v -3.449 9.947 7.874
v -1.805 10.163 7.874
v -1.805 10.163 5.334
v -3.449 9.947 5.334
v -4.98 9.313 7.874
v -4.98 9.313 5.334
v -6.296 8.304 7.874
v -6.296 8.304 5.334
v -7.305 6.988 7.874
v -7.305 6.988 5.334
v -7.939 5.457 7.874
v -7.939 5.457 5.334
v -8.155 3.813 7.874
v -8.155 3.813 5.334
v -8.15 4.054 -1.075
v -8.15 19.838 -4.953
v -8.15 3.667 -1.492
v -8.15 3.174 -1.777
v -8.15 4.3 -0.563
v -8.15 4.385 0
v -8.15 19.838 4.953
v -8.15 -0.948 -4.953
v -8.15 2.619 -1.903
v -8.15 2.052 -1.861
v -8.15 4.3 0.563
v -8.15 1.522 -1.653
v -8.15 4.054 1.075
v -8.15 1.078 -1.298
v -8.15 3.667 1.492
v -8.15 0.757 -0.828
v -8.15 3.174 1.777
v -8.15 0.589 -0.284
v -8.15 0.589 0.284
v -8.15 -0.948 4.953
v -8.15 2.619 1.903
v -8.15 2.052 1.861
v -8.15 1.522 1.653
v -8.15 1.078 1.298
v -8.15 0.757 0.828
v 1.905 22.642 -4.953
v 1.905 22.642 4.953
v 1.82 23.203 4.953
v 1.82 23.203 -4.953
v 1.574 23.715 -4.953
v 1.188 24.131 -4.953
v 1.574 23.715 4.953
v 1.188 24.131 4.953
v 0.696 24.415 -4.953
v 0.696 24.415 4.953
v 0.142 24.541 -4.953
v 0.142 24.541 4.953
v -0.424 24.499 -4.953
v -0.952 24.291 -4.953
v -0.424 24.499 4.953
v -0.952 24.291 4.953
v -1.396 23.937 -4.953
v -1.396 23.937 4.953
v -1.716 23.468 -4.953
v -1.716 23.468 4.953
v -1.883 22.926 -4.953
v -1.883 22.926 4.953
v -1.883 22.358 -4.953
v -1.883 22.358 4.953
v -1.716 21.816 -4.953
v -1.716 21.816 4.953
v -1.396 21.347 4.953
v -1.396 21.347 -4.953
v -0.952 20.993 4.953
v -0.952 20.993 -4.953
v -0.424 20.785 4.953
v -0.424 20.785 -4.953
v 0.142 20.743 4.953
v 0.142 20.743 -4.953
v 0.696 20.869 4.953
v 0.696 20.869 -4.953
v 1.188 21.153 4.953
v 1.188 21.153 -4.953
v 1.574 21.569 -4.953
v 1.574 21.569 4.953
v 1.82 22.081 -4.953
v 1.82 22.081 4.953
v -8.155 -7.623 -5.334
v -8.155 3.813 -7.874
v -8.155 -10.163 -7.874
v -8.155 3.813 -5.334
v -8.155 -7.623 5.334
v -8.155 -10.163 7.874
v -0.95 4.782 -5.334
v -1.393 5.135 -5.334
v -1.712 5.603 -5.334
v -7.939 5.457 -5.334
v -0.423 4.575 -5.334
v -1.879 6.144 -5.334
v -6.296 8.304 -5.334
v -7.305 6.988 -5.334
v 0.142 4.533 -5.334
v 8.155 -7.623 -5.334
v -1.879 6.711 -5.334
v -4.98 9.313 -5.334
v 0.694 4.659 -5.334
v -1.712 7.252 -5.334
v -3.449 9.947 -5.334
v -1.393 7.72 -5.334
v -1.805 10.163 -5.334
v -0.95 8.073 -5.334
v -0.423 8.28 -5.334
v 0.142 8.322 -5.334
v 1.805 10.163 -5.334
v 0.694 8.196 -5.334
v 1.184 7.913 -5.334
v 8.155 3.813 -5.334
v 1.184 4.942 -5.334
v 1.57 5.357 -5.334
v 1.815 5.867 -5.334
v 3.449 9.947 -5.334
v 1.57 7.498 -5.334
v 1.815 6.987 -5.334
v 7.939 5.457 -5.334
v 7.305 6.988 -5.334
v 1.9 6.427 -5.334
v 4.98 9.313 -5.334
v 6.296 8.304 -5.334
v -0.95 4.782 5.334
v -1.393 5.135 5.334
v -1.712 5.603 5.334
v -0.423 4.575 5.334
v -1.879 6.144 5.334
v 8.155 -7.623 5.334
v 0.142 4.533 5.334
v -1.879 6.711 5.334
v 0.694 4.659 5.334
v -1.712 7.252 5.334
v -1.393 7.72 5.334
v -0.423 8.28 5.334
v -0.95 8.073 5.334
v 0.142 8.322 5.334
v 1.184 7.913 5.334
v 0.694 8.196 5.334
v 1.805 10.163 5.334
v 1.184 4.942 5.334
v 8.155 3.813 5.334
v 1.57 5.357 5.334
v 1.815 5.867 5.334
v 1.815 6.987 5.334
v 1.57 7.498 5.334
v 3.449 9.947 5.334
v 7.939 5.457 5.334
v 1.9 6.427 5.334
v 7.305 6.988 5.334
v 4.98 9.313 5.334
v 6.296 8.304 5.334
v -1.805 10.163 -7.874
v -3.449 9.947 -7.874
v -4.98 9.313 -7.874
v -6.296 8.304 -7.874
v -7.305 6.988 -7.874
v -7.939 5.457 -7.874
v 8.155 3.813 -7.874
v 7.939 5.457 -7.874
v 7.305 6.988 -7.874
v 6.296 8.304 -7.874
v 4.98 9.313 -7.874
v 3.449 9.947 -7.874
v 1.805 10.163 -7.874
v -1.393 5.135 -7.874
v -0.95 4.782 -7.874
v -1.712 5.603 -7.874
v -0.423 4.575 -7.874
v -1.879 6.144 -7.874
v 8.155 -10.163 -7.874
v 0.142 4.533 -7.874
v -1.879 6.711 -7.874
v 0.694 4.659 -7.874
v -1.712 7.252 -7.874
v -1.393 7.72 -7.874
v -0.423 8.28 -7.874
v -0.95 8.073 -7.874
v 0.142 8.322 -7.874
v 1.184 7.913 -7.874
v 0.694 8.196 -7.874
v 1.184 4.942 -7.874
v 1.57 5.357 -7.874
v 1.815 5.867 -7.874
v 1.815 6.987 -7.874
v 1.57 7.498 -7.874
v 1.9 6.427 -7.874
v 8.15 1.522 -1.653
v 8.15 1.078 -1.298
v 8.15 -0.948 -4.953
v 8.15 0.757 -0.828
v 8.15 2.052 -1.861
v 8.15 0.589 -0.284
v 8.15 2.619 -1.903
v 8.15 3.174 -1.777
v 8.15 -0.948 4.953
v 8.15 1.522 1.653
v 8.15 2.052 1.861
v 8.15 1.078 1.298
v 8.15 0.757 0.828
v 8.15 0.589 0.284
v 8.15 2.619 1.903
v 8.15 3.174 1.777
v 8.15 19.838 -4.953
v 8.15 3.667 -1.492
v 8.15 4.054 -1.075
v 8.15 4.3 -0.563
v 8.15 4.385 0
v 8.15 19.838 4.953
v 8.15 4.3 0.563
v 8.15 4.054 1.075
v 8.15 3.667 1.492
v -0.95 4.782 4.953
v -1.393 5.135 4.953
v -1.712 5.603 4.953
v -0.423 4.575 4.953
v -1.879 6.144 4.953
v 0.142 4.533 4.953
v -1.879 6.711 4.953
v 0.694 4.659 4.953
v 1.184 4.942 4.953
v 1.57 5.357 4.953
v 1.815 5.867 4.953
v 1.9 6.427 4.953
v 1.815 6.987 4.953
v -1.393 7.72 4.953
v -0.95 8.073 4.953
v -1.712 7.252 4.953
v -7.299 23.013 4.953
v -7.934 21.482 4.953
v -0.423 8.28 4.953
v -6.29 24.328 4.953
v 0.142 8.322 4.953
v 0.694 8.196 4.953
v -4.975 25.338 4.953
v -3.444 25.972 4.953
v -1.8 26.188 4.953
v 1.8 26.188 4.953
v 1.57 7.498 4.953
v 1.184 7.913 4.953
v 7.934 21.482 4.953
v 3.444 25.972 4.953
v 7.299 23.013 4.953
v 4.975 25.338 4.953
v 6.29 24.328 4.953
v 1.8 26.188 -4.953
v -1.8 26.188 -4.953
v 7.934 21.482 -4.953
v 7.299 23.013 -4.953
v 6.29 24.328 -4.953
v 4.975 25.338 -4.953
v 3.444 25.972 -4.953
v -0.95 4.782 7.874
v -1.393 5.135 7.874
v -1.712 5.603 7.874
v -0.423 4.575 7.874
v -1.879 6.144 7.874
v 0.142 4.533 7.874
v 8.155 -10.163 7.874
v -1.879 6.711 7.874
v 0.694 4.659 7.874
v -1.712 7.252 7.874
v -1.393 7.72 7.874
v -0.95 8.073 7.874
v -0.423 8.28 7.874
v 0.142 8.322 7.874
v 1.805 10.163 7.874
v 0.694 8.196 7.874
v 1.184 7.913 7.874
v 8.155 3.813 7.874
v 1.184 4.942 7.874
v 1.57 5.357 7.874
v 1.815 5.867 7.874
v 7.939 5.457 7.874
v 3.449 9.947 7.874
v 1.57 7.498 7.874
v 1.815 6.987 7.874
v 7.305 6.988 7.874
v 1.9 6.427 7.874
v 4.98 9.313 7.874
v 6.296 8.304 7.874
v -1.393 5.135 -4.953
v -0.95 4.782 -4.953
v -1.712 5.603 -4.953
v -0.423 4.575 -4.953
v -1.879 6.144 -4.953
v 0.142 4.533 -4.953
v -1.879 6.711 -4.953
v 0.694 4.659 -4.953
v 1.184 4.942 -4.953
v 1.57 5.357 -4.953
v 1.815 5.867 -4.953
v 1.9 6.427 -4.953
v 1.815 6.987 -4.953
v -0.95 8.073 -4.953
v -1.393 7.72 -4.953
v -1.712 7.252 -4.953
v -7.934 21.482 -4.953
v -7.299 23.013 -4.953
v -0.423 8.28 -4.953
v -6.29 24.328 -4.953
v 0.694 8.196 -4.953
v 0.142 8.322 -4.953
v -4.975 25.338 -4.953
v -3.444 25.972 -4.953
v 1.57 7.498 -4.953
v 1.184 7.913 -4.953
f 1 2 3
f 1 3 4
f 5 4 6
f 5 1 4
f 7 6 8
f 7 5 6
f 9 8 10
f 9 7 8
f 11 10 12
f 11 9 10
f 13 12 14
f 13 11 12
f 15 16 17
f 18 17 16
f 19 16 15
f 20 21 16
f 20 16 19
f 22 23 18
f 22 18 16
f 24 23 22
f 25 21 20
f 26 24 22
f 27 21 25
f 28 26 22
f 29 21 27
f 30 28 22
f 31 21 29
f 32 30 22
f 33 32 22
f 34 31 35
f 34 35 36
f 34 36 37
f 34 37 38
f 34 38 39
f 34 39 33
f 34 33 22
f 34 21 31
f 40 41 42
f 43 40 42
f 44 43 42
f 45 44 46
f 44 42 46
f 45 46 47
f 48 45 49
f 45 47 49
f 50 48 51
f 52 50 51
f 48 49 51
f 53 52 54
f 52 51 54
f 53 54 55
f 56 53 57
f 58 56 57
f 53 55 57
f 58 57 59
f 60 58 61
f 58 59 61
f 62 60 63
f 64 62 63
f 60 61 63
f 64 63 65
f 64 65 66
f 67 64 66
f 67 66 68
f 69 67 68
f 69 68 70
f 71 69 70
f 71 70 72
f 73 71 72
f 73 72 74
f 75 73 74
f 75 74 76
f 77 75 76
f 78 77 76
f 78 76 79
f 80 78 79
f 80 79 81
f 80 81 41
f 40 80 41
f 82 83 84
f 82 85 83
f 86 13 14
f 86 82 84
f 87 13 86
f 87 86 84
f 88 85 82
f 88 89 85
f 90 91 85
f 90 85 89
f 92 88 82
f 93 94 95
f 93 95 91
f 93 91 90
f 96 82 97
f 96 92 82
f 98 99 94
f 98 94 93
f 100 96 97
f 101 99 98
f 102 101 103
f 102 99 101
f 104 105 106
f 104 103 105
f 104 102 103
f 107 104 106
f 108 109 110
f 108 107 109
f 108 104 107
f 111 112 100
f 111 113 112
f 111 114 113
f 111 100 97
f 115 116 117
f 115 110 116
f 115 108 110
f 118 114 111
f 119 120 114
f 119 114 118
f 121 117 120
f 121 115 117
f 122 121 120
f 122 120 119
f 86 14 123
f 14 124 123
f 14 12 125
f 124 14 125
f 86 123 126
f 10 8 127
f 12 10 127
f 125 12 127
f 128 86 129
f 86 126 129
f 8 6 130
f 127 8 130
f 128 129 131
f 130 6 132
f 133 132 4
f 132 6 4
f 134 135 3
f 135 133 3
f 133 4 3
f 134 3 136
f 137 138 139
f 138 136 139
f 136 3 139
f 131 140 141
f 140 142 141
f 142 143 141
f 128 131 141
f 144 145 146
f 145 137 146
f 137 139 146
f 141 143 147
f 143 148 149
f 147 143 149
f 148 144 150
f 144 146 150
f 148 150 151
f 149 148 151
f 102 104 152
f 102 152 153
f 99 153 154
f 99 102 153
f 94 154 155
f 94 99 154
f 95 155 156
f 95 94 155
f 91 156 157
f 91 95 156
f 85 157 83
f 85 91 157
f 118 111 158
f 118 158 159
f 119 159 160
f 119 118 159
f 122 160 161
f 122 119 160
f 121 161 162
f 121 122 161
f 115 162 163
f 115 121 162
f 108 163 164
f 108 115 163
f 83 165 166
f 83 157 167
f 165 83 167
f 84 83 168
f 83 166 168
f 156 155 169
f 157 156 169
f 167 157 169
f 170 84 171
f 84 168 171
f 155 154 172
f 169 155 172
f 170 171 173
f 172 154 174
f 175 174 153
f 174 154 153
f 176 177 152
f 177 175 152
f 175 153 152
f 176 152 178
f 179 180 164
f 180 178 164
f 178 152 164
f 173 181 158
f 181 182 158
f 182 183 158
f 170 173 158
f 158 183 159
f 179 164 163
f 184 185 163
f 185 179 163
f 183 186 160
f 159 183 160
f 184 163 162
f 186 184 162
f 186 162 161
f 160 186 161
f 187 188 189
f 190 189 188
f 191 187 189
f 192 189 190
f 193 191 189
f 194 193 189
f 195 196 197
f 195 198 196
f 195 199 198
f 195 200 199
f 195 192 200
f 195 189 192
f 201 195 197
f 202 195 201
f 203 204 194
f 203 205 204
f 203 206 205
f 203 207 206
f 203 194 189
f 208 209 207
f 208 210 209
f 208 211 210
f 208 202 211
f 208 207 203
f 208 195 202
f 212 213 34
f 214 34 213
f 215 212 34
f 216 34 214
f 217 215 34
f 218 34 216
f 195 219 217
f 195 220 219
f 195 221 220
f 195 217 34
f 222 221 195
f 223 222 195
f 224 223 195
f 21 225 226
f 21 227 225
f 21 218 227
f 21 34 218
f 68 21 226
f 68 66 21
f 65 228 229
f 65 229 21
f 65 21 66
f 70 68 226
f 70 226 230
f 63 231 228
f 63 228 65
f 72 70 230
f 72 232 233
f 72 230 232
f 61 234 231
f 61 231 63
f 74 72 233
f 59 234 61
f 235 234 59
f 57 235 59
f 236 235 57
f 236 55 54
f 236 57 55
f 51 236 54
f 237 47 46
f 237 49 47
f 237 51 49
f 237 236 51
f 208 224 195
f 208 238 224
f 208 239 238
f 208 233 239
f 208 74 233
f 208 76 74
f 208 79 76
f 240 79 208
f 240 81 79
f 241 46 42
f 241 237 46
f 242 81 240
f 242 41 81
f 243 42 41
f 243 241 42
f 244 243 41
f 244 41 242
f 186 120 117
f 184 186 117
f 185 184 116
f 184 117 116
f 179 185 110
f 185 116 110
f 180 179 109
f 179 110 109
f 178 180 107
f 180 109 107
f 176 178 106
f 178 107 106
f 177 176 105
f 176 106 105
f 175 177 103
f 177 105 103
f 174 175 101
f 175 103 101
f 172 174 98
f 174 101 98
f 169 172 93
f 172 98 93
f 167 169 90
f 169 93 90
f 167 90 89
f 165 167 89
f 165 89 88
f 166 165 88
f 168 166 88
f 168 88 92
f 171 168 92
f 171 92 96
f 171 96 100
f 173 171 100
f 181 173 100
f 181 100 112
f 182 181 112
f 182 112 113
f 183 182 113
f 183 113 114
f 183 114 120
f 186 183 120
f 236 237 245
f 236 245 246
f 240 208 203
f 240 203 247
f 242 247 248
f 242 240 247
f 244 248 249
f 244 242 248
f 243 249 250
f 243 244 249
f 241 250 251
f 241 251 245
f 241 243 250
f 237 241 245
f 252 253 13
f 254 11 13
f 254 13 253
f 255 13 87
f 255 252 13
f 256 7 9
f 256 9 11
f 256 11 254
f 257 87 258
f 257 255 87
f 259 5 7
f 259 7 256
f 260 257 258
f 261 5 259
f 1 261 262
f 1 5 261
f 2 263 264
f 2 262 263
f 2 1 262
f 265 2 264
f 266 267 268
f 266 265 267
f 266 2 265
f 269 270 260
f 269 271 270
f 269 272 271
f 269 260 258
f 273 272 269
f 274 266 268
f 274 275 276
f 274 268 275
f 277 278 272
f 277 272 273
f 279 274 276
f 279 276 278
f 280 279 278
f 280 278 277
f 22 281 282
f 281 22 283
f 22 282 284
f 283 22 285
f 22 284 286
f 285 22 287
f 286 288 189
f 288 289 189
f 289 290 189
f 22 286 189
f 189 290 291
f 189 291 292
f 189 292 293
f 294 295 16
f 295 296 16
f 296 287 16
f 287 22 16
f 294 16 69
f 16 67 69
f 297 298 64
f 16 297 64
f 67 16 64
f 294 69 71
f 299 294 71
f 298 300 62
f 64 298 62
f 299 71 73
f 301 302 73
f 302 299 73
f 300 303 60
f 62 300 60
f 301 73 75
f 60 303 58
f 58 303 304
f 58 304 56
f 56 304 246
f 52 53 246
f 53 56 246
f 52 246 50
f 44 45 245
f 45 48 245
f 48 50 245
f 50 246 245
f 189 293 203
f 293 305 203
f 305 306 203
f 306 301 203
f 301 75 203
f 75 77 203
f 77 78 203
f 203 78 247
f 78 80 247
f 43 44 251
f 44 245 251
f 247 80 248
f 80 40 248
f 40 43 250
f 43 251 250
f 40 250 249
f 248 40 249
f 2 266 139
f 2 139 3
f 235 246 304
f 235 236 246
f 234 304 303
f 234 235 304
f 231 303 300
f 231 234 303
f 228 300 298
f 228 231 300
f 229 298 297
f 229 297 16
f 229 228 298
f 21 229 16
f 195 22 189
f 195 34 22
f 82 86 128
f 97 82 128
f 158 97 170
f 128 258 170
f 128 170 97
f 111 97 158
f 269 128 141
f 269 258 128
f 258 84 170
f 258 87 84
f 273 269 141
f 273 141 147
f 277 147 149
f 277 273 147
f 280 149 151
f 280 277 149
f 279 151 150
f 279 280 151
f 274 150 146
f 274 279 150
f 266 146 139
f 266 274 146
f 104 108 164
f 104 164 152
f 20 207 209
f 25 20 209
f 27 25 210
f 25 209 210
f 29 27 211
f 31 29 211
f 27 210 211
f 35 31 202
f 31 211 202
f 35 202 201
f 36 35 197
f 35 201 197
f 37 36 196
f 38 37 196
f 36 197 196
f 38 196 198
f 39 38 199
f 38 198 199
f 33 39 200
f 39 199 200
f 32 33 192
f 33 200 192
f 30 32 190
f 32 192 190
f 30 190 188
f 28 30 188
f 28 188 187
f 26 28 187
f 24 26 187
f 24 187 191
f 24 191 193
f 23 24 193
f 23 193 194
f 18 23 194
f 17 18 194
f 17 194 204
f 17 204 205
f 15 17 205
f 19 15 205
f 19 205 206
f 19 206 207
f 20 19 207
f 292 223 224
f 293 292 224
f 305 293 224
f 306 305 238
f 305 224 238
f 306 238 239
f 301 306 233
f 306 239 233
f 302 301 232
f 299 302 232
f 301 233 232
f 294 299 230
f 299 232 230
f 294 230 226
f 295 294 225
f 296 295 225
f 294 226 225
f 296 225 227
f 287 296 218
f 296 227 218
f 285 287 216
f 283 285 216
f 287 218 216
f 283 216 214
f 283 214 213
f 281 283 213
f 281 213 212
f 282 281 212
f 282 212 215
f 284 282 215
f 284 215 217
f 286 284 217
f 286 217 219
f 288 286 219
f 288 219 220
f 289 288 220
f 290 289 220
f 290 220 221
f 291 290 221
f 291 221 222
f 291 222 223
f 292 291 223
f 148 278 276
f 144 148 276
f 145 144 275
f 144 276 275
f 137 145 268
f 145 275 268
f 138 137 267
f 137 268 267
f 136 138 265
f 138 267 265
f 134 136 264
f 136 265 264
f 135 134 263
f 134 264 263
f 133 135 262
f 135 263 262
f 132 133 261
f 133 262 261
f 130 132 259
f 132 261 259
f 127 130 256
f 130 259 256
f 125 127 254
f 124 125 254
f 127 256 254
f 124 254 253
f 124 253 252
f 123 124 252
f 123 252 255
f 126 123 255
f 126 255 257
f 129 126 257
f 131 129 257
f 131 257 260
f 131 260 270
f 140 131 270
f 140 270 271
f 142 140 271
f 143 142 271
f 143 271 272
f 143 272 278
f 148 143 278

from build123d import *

# Parameters (mm, degrees)
F1_DEPTH      = 7.874
F1_DEPTH_BACK = 7.874
F2_T          = -2.54
F4_DEPTH      = 4.953
F4_DEPTH_BACK = 4.953
F5_R          = 1.899737
F6_DEPTH      = 17.018
F5_R_2        = 1.90461
F7_DEPTH      = 14.986
F8_R          = 1.908602
F9_DEPTH      = 17.272


with BuildPart() as f1:
    # F0 (on Top) → F1 (new body, two sides)
    with BuildSketch(Plane.XY) as f1_sk:
        with BuildLine():
            Line((-8.155428, -10.163382), (8.155428, -10.163382))
            Line((8.155428, -10.163382), (8.155428, 3.813382))
            ThreePointArc((8.155428, 3.813382), (6.295556, 8.30351), (1.805428, 10.163382))
            Line((1.805428, 10.163382), (-1.805428, 10.163382))
            ThreePointArc((-1.805428, 10.163382), (-6.295556, 8.30351), (-8.155428, 3.813382))
            Line((-8.155428, 3.813382), (-8.155428, -10.163382))
        make_face()
    extrude(amount=F1_DEPTH)
    extrude(f1_sk.sketch, amount=-F1_DEPTH_BACK)

    # F2
    f2_openings = [f1.faces().sort_by_distance(p)[0] for p in [
        (8.155428, -3.175, 0),
        (6.295556, 8.30351, 0),
        (0, 10.163382, 0),
        (-6.295556, 8.30351, 0),
        (-8.155428, -3.175, 0),
    ]]
    offset(amount=F2_T, openings=f2_openings)


with BuildPart() as f4:
    # F3 (on Top) → F4 (new body, two sides)
    with BuildSketch(Plane.XY) as f4_sk:
        with BuildLine():
            Line((-8.150021, -0.947974), (8.150021, -0.947974))
            Line((8.150021, -0.947974), (8.150021, 19.838358))
            ThreePointArc((8.150021, 19.838358), (6.290149, 24.328486), (1.800021, 26.188358))
            Line((1.800021, 26.188358), (-1.800021, 26.188358))
            ThreePointArc((-1.800021, 26.188358), (-6.290149, 24.328486), (-8.150021, 19.838358))
            Line((-8.150021, 19.838358), (-8.150021, -0.947974))
        make_face()
    extrude(amount=F4_DEPTH)
    extrude(f4_sk.sketch, amount=-F4_DEPTH_BACK)


with BuildPart() as f6_tool:
    # F5 (on face) → F6 (new body)
    with BuildSketch(Plane.XY.offset(7.874)):
        with Locations((0, 6.427398)):
            Circle(F5_R)
    extrude(amount=-F6_DEPTH)


with BuildPart() as f1_1:
    add(f1.part)

    # F6: cut by f6_tool
    add(f6_tool.part, mode=Mode.SUBTRACT)


with BuildPart() as f4_1:
    add(f4.part)

    # F6: cut by f6_tool
    add(f6_tool.part, mode=Mode.SUBTRACT)

    # F5 (on face) → F7 (cut)
    with BuildSketch(Plane.XY.offset(7.874)):
        with Locations((0, 22.641998)):
            Circle(F5_R_2)
    extrude(amount=-F7_DEPTH, mode=Mode.SUBTRACT)

    # F8 (on face) → F9 (cut)
    with BuildSketch(Plane.YZ.offset(8.150021)):
        with Locations((2.476655, 0)):
            Circle(F8_R)
    extrude(amount=-F9_DEPTH, mode=Mode.SUBTRACT)


solid = Compound([f1_1.part, f4_1.part])
